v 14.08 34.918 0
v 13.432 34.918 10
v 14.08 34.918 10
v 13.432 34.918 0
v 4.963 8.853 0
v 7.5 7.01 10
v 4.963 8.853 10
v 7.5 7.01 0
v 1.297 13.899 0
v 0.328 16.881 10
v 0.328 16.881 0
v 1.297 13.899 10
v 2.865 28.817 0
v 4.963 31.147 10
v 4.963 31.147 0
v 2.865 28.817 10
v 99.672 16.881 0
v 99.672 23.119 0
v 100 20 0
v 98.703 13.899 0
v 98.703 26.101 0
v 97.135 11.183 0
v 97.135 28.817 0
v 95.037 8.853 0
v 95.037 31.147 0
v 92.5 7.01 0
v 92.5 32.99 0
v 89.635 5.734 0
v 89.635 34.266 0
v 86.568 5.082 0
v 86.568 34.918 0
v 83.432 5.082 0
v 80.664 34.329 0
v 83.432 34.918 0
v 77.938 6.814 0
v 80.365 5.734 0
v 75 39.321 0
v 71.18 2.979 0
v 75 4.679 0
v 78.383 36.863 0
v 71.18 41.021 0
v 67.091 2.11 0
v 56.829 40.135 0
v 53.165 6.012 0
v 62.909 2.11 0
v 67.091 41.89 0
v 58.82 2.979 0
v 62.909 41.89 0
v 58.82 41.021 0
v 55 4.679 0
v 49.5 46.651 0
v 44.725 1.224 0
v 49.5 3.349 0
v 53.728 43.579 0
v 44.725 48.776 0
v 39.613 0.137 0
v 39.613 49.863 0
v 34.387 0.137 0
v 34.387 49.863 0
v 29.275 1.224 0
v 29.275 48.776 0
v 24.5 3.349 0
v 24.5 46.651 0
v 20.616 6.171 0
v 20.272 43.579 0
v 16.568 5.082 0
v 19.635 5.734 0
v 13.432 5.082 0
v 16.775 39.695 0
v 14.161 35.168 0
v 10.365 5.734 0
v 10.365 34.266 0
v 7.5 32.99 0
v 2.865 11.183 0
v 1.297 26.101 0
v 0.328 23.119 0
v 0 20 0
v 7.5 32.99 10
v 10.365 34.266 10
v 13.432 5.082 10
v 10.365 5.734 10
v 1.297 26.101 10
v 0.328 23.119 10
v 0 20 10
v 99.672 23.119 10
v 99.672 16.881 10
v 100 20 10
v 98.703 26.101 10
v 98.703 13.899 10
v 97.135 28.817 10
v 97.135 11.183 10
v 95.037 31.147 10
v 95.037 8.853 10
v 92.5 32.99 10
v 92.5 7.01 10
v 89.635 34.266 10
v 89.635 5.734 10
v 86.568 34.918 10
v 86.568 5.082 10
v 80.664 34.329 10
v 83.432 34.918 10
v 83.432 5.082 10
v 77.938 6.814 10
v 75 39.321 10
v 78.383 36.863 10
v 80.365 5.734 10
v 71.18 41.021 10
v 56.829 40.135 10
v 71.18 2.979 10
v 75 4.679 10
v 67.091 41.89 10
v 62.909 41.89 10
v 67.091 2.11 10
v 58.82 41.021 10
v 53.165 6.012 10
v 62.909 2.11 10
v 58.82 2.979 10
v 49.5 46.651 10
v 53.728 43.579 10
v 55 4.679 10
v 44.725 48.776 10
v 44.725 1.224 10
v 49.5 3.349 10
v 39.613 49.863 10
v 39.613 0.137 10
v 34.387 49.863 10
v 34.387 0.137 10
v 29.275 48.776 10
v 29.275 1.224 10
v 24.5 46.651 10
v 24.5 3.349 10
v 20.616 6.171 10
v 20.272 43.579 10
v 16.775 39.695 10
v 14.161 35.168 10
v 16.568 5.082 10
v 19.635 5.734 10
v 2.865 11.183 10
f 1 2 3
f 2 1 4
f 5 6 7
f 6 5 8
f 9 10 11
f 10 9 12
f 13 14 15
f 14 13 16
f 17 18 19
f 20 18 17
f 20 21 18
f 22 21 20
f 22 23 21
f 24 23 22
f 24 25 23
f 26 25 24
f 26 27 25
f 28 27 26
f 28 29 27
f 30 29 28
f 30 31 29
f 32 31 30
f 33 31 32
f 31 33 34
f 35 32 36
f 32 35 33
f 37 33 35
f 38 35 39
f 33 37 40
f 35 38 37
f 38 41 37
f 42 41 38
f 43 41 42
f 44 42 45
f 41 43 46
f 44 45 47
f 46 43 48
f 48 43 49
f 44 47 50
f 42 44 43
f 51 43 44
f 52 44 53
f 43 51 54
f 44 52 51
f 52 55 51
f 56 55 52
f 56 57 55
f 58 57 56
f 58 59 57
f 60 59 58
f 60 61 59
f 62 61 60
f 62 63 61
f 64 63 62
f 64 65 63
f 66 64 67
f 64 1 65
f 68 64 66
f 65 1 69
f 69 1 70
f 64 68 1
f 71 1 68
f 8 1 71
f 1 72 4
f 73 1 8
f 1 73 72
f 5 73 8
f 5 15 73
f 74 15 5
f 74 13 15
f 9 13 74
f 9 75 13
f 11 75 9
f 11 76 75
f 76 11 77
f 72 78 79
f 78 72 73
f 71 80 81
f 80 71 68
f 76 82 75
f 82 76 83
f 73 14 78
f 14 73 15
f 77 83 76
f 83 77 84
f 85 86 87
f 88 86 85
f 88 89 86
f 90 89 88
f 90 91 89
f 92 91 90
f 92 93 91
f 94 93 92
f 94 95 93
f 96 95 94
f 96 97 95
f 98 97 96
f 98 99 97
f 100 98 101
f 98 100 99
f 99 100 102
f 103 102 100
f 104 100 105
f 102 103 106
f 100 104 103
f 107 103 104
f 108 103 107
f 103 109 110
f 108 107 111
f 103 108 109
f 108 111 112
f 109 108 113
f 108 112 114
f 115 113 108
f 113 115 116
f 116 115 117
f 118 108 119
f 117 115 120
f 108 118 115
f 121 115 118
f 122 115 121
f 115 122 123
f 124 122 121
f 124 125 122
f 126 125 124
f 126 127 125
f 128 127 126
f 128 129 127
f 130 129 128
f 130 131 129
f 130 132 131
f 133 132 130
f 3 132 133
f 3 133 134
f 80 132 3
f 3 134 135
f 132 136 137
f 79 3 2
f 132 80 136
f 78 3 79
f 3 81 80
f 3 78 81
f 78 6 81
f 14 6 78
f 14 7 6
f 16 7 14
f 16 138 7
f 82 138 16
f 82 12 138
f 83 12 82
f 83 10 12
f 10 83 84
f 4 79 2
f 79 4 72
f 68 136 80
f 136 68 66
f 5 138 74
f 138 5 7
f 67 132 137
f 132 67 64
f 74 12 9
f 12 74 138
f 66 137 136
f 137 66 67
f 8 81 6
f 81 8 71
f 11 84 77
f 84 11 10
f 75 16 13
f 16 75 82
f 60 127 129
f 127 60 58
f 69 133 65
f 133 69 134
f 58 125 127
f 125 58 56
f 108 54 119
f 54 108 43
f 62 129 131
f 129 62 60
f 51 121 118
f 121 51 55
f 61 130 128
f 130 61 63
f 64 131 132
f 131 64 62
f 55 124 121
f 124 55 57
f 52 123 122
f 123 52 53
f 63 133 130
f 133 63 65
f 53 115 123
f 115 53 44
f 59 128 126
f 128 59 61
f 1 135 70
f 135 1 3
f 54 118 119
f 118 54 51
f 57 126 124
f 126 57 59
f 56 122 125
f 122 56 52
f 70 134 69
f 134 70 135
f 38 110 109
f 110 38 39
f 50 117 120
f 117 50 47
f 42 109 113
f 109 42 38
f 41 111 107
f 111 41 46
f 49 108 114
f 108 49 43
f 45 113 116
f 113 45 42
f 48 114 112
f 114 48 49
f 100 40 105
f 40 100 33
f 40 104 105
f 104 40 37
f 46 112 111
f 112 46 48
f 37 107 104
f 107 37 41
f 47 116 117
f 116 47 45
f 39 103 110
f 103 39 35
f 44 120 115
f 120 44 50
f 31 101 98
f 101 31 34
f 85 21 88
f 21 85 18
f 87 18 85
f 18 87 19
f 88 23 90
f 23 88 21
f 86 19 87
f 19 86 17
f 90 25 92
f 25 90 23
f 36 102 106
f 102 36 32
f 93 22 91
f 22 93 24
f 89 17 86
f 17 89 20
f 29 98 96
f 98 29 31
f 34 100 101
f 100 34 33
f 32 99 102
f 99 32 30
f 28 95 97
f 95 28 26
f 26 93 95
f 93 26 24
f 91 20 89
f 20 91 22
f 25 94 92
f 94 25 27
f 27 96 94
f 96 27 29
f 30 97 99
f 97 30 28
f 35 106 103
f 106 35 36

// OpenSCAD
/*
Makes a cloud object.

parameters:
width		The width of the cloud. This also determine the height, because the height is half the width.
thick		Thickness of the object.
*/

cloud(100, 10);

module cloud(width, thick){

translate([width*.15, width*.2, 0])
cylinder(h = thick, r = width*.15);

translate([width*.37, width*.25, 0]) 
cylinder(h = thick, r = width*.25);

translate([width*.65, width*.22, 0])
cylinder(h = thick, r = width*.2);

translate([width*.85, width*.2, 0])
cylinder(h = thick, r = width*.15);
}//end of module cloud
